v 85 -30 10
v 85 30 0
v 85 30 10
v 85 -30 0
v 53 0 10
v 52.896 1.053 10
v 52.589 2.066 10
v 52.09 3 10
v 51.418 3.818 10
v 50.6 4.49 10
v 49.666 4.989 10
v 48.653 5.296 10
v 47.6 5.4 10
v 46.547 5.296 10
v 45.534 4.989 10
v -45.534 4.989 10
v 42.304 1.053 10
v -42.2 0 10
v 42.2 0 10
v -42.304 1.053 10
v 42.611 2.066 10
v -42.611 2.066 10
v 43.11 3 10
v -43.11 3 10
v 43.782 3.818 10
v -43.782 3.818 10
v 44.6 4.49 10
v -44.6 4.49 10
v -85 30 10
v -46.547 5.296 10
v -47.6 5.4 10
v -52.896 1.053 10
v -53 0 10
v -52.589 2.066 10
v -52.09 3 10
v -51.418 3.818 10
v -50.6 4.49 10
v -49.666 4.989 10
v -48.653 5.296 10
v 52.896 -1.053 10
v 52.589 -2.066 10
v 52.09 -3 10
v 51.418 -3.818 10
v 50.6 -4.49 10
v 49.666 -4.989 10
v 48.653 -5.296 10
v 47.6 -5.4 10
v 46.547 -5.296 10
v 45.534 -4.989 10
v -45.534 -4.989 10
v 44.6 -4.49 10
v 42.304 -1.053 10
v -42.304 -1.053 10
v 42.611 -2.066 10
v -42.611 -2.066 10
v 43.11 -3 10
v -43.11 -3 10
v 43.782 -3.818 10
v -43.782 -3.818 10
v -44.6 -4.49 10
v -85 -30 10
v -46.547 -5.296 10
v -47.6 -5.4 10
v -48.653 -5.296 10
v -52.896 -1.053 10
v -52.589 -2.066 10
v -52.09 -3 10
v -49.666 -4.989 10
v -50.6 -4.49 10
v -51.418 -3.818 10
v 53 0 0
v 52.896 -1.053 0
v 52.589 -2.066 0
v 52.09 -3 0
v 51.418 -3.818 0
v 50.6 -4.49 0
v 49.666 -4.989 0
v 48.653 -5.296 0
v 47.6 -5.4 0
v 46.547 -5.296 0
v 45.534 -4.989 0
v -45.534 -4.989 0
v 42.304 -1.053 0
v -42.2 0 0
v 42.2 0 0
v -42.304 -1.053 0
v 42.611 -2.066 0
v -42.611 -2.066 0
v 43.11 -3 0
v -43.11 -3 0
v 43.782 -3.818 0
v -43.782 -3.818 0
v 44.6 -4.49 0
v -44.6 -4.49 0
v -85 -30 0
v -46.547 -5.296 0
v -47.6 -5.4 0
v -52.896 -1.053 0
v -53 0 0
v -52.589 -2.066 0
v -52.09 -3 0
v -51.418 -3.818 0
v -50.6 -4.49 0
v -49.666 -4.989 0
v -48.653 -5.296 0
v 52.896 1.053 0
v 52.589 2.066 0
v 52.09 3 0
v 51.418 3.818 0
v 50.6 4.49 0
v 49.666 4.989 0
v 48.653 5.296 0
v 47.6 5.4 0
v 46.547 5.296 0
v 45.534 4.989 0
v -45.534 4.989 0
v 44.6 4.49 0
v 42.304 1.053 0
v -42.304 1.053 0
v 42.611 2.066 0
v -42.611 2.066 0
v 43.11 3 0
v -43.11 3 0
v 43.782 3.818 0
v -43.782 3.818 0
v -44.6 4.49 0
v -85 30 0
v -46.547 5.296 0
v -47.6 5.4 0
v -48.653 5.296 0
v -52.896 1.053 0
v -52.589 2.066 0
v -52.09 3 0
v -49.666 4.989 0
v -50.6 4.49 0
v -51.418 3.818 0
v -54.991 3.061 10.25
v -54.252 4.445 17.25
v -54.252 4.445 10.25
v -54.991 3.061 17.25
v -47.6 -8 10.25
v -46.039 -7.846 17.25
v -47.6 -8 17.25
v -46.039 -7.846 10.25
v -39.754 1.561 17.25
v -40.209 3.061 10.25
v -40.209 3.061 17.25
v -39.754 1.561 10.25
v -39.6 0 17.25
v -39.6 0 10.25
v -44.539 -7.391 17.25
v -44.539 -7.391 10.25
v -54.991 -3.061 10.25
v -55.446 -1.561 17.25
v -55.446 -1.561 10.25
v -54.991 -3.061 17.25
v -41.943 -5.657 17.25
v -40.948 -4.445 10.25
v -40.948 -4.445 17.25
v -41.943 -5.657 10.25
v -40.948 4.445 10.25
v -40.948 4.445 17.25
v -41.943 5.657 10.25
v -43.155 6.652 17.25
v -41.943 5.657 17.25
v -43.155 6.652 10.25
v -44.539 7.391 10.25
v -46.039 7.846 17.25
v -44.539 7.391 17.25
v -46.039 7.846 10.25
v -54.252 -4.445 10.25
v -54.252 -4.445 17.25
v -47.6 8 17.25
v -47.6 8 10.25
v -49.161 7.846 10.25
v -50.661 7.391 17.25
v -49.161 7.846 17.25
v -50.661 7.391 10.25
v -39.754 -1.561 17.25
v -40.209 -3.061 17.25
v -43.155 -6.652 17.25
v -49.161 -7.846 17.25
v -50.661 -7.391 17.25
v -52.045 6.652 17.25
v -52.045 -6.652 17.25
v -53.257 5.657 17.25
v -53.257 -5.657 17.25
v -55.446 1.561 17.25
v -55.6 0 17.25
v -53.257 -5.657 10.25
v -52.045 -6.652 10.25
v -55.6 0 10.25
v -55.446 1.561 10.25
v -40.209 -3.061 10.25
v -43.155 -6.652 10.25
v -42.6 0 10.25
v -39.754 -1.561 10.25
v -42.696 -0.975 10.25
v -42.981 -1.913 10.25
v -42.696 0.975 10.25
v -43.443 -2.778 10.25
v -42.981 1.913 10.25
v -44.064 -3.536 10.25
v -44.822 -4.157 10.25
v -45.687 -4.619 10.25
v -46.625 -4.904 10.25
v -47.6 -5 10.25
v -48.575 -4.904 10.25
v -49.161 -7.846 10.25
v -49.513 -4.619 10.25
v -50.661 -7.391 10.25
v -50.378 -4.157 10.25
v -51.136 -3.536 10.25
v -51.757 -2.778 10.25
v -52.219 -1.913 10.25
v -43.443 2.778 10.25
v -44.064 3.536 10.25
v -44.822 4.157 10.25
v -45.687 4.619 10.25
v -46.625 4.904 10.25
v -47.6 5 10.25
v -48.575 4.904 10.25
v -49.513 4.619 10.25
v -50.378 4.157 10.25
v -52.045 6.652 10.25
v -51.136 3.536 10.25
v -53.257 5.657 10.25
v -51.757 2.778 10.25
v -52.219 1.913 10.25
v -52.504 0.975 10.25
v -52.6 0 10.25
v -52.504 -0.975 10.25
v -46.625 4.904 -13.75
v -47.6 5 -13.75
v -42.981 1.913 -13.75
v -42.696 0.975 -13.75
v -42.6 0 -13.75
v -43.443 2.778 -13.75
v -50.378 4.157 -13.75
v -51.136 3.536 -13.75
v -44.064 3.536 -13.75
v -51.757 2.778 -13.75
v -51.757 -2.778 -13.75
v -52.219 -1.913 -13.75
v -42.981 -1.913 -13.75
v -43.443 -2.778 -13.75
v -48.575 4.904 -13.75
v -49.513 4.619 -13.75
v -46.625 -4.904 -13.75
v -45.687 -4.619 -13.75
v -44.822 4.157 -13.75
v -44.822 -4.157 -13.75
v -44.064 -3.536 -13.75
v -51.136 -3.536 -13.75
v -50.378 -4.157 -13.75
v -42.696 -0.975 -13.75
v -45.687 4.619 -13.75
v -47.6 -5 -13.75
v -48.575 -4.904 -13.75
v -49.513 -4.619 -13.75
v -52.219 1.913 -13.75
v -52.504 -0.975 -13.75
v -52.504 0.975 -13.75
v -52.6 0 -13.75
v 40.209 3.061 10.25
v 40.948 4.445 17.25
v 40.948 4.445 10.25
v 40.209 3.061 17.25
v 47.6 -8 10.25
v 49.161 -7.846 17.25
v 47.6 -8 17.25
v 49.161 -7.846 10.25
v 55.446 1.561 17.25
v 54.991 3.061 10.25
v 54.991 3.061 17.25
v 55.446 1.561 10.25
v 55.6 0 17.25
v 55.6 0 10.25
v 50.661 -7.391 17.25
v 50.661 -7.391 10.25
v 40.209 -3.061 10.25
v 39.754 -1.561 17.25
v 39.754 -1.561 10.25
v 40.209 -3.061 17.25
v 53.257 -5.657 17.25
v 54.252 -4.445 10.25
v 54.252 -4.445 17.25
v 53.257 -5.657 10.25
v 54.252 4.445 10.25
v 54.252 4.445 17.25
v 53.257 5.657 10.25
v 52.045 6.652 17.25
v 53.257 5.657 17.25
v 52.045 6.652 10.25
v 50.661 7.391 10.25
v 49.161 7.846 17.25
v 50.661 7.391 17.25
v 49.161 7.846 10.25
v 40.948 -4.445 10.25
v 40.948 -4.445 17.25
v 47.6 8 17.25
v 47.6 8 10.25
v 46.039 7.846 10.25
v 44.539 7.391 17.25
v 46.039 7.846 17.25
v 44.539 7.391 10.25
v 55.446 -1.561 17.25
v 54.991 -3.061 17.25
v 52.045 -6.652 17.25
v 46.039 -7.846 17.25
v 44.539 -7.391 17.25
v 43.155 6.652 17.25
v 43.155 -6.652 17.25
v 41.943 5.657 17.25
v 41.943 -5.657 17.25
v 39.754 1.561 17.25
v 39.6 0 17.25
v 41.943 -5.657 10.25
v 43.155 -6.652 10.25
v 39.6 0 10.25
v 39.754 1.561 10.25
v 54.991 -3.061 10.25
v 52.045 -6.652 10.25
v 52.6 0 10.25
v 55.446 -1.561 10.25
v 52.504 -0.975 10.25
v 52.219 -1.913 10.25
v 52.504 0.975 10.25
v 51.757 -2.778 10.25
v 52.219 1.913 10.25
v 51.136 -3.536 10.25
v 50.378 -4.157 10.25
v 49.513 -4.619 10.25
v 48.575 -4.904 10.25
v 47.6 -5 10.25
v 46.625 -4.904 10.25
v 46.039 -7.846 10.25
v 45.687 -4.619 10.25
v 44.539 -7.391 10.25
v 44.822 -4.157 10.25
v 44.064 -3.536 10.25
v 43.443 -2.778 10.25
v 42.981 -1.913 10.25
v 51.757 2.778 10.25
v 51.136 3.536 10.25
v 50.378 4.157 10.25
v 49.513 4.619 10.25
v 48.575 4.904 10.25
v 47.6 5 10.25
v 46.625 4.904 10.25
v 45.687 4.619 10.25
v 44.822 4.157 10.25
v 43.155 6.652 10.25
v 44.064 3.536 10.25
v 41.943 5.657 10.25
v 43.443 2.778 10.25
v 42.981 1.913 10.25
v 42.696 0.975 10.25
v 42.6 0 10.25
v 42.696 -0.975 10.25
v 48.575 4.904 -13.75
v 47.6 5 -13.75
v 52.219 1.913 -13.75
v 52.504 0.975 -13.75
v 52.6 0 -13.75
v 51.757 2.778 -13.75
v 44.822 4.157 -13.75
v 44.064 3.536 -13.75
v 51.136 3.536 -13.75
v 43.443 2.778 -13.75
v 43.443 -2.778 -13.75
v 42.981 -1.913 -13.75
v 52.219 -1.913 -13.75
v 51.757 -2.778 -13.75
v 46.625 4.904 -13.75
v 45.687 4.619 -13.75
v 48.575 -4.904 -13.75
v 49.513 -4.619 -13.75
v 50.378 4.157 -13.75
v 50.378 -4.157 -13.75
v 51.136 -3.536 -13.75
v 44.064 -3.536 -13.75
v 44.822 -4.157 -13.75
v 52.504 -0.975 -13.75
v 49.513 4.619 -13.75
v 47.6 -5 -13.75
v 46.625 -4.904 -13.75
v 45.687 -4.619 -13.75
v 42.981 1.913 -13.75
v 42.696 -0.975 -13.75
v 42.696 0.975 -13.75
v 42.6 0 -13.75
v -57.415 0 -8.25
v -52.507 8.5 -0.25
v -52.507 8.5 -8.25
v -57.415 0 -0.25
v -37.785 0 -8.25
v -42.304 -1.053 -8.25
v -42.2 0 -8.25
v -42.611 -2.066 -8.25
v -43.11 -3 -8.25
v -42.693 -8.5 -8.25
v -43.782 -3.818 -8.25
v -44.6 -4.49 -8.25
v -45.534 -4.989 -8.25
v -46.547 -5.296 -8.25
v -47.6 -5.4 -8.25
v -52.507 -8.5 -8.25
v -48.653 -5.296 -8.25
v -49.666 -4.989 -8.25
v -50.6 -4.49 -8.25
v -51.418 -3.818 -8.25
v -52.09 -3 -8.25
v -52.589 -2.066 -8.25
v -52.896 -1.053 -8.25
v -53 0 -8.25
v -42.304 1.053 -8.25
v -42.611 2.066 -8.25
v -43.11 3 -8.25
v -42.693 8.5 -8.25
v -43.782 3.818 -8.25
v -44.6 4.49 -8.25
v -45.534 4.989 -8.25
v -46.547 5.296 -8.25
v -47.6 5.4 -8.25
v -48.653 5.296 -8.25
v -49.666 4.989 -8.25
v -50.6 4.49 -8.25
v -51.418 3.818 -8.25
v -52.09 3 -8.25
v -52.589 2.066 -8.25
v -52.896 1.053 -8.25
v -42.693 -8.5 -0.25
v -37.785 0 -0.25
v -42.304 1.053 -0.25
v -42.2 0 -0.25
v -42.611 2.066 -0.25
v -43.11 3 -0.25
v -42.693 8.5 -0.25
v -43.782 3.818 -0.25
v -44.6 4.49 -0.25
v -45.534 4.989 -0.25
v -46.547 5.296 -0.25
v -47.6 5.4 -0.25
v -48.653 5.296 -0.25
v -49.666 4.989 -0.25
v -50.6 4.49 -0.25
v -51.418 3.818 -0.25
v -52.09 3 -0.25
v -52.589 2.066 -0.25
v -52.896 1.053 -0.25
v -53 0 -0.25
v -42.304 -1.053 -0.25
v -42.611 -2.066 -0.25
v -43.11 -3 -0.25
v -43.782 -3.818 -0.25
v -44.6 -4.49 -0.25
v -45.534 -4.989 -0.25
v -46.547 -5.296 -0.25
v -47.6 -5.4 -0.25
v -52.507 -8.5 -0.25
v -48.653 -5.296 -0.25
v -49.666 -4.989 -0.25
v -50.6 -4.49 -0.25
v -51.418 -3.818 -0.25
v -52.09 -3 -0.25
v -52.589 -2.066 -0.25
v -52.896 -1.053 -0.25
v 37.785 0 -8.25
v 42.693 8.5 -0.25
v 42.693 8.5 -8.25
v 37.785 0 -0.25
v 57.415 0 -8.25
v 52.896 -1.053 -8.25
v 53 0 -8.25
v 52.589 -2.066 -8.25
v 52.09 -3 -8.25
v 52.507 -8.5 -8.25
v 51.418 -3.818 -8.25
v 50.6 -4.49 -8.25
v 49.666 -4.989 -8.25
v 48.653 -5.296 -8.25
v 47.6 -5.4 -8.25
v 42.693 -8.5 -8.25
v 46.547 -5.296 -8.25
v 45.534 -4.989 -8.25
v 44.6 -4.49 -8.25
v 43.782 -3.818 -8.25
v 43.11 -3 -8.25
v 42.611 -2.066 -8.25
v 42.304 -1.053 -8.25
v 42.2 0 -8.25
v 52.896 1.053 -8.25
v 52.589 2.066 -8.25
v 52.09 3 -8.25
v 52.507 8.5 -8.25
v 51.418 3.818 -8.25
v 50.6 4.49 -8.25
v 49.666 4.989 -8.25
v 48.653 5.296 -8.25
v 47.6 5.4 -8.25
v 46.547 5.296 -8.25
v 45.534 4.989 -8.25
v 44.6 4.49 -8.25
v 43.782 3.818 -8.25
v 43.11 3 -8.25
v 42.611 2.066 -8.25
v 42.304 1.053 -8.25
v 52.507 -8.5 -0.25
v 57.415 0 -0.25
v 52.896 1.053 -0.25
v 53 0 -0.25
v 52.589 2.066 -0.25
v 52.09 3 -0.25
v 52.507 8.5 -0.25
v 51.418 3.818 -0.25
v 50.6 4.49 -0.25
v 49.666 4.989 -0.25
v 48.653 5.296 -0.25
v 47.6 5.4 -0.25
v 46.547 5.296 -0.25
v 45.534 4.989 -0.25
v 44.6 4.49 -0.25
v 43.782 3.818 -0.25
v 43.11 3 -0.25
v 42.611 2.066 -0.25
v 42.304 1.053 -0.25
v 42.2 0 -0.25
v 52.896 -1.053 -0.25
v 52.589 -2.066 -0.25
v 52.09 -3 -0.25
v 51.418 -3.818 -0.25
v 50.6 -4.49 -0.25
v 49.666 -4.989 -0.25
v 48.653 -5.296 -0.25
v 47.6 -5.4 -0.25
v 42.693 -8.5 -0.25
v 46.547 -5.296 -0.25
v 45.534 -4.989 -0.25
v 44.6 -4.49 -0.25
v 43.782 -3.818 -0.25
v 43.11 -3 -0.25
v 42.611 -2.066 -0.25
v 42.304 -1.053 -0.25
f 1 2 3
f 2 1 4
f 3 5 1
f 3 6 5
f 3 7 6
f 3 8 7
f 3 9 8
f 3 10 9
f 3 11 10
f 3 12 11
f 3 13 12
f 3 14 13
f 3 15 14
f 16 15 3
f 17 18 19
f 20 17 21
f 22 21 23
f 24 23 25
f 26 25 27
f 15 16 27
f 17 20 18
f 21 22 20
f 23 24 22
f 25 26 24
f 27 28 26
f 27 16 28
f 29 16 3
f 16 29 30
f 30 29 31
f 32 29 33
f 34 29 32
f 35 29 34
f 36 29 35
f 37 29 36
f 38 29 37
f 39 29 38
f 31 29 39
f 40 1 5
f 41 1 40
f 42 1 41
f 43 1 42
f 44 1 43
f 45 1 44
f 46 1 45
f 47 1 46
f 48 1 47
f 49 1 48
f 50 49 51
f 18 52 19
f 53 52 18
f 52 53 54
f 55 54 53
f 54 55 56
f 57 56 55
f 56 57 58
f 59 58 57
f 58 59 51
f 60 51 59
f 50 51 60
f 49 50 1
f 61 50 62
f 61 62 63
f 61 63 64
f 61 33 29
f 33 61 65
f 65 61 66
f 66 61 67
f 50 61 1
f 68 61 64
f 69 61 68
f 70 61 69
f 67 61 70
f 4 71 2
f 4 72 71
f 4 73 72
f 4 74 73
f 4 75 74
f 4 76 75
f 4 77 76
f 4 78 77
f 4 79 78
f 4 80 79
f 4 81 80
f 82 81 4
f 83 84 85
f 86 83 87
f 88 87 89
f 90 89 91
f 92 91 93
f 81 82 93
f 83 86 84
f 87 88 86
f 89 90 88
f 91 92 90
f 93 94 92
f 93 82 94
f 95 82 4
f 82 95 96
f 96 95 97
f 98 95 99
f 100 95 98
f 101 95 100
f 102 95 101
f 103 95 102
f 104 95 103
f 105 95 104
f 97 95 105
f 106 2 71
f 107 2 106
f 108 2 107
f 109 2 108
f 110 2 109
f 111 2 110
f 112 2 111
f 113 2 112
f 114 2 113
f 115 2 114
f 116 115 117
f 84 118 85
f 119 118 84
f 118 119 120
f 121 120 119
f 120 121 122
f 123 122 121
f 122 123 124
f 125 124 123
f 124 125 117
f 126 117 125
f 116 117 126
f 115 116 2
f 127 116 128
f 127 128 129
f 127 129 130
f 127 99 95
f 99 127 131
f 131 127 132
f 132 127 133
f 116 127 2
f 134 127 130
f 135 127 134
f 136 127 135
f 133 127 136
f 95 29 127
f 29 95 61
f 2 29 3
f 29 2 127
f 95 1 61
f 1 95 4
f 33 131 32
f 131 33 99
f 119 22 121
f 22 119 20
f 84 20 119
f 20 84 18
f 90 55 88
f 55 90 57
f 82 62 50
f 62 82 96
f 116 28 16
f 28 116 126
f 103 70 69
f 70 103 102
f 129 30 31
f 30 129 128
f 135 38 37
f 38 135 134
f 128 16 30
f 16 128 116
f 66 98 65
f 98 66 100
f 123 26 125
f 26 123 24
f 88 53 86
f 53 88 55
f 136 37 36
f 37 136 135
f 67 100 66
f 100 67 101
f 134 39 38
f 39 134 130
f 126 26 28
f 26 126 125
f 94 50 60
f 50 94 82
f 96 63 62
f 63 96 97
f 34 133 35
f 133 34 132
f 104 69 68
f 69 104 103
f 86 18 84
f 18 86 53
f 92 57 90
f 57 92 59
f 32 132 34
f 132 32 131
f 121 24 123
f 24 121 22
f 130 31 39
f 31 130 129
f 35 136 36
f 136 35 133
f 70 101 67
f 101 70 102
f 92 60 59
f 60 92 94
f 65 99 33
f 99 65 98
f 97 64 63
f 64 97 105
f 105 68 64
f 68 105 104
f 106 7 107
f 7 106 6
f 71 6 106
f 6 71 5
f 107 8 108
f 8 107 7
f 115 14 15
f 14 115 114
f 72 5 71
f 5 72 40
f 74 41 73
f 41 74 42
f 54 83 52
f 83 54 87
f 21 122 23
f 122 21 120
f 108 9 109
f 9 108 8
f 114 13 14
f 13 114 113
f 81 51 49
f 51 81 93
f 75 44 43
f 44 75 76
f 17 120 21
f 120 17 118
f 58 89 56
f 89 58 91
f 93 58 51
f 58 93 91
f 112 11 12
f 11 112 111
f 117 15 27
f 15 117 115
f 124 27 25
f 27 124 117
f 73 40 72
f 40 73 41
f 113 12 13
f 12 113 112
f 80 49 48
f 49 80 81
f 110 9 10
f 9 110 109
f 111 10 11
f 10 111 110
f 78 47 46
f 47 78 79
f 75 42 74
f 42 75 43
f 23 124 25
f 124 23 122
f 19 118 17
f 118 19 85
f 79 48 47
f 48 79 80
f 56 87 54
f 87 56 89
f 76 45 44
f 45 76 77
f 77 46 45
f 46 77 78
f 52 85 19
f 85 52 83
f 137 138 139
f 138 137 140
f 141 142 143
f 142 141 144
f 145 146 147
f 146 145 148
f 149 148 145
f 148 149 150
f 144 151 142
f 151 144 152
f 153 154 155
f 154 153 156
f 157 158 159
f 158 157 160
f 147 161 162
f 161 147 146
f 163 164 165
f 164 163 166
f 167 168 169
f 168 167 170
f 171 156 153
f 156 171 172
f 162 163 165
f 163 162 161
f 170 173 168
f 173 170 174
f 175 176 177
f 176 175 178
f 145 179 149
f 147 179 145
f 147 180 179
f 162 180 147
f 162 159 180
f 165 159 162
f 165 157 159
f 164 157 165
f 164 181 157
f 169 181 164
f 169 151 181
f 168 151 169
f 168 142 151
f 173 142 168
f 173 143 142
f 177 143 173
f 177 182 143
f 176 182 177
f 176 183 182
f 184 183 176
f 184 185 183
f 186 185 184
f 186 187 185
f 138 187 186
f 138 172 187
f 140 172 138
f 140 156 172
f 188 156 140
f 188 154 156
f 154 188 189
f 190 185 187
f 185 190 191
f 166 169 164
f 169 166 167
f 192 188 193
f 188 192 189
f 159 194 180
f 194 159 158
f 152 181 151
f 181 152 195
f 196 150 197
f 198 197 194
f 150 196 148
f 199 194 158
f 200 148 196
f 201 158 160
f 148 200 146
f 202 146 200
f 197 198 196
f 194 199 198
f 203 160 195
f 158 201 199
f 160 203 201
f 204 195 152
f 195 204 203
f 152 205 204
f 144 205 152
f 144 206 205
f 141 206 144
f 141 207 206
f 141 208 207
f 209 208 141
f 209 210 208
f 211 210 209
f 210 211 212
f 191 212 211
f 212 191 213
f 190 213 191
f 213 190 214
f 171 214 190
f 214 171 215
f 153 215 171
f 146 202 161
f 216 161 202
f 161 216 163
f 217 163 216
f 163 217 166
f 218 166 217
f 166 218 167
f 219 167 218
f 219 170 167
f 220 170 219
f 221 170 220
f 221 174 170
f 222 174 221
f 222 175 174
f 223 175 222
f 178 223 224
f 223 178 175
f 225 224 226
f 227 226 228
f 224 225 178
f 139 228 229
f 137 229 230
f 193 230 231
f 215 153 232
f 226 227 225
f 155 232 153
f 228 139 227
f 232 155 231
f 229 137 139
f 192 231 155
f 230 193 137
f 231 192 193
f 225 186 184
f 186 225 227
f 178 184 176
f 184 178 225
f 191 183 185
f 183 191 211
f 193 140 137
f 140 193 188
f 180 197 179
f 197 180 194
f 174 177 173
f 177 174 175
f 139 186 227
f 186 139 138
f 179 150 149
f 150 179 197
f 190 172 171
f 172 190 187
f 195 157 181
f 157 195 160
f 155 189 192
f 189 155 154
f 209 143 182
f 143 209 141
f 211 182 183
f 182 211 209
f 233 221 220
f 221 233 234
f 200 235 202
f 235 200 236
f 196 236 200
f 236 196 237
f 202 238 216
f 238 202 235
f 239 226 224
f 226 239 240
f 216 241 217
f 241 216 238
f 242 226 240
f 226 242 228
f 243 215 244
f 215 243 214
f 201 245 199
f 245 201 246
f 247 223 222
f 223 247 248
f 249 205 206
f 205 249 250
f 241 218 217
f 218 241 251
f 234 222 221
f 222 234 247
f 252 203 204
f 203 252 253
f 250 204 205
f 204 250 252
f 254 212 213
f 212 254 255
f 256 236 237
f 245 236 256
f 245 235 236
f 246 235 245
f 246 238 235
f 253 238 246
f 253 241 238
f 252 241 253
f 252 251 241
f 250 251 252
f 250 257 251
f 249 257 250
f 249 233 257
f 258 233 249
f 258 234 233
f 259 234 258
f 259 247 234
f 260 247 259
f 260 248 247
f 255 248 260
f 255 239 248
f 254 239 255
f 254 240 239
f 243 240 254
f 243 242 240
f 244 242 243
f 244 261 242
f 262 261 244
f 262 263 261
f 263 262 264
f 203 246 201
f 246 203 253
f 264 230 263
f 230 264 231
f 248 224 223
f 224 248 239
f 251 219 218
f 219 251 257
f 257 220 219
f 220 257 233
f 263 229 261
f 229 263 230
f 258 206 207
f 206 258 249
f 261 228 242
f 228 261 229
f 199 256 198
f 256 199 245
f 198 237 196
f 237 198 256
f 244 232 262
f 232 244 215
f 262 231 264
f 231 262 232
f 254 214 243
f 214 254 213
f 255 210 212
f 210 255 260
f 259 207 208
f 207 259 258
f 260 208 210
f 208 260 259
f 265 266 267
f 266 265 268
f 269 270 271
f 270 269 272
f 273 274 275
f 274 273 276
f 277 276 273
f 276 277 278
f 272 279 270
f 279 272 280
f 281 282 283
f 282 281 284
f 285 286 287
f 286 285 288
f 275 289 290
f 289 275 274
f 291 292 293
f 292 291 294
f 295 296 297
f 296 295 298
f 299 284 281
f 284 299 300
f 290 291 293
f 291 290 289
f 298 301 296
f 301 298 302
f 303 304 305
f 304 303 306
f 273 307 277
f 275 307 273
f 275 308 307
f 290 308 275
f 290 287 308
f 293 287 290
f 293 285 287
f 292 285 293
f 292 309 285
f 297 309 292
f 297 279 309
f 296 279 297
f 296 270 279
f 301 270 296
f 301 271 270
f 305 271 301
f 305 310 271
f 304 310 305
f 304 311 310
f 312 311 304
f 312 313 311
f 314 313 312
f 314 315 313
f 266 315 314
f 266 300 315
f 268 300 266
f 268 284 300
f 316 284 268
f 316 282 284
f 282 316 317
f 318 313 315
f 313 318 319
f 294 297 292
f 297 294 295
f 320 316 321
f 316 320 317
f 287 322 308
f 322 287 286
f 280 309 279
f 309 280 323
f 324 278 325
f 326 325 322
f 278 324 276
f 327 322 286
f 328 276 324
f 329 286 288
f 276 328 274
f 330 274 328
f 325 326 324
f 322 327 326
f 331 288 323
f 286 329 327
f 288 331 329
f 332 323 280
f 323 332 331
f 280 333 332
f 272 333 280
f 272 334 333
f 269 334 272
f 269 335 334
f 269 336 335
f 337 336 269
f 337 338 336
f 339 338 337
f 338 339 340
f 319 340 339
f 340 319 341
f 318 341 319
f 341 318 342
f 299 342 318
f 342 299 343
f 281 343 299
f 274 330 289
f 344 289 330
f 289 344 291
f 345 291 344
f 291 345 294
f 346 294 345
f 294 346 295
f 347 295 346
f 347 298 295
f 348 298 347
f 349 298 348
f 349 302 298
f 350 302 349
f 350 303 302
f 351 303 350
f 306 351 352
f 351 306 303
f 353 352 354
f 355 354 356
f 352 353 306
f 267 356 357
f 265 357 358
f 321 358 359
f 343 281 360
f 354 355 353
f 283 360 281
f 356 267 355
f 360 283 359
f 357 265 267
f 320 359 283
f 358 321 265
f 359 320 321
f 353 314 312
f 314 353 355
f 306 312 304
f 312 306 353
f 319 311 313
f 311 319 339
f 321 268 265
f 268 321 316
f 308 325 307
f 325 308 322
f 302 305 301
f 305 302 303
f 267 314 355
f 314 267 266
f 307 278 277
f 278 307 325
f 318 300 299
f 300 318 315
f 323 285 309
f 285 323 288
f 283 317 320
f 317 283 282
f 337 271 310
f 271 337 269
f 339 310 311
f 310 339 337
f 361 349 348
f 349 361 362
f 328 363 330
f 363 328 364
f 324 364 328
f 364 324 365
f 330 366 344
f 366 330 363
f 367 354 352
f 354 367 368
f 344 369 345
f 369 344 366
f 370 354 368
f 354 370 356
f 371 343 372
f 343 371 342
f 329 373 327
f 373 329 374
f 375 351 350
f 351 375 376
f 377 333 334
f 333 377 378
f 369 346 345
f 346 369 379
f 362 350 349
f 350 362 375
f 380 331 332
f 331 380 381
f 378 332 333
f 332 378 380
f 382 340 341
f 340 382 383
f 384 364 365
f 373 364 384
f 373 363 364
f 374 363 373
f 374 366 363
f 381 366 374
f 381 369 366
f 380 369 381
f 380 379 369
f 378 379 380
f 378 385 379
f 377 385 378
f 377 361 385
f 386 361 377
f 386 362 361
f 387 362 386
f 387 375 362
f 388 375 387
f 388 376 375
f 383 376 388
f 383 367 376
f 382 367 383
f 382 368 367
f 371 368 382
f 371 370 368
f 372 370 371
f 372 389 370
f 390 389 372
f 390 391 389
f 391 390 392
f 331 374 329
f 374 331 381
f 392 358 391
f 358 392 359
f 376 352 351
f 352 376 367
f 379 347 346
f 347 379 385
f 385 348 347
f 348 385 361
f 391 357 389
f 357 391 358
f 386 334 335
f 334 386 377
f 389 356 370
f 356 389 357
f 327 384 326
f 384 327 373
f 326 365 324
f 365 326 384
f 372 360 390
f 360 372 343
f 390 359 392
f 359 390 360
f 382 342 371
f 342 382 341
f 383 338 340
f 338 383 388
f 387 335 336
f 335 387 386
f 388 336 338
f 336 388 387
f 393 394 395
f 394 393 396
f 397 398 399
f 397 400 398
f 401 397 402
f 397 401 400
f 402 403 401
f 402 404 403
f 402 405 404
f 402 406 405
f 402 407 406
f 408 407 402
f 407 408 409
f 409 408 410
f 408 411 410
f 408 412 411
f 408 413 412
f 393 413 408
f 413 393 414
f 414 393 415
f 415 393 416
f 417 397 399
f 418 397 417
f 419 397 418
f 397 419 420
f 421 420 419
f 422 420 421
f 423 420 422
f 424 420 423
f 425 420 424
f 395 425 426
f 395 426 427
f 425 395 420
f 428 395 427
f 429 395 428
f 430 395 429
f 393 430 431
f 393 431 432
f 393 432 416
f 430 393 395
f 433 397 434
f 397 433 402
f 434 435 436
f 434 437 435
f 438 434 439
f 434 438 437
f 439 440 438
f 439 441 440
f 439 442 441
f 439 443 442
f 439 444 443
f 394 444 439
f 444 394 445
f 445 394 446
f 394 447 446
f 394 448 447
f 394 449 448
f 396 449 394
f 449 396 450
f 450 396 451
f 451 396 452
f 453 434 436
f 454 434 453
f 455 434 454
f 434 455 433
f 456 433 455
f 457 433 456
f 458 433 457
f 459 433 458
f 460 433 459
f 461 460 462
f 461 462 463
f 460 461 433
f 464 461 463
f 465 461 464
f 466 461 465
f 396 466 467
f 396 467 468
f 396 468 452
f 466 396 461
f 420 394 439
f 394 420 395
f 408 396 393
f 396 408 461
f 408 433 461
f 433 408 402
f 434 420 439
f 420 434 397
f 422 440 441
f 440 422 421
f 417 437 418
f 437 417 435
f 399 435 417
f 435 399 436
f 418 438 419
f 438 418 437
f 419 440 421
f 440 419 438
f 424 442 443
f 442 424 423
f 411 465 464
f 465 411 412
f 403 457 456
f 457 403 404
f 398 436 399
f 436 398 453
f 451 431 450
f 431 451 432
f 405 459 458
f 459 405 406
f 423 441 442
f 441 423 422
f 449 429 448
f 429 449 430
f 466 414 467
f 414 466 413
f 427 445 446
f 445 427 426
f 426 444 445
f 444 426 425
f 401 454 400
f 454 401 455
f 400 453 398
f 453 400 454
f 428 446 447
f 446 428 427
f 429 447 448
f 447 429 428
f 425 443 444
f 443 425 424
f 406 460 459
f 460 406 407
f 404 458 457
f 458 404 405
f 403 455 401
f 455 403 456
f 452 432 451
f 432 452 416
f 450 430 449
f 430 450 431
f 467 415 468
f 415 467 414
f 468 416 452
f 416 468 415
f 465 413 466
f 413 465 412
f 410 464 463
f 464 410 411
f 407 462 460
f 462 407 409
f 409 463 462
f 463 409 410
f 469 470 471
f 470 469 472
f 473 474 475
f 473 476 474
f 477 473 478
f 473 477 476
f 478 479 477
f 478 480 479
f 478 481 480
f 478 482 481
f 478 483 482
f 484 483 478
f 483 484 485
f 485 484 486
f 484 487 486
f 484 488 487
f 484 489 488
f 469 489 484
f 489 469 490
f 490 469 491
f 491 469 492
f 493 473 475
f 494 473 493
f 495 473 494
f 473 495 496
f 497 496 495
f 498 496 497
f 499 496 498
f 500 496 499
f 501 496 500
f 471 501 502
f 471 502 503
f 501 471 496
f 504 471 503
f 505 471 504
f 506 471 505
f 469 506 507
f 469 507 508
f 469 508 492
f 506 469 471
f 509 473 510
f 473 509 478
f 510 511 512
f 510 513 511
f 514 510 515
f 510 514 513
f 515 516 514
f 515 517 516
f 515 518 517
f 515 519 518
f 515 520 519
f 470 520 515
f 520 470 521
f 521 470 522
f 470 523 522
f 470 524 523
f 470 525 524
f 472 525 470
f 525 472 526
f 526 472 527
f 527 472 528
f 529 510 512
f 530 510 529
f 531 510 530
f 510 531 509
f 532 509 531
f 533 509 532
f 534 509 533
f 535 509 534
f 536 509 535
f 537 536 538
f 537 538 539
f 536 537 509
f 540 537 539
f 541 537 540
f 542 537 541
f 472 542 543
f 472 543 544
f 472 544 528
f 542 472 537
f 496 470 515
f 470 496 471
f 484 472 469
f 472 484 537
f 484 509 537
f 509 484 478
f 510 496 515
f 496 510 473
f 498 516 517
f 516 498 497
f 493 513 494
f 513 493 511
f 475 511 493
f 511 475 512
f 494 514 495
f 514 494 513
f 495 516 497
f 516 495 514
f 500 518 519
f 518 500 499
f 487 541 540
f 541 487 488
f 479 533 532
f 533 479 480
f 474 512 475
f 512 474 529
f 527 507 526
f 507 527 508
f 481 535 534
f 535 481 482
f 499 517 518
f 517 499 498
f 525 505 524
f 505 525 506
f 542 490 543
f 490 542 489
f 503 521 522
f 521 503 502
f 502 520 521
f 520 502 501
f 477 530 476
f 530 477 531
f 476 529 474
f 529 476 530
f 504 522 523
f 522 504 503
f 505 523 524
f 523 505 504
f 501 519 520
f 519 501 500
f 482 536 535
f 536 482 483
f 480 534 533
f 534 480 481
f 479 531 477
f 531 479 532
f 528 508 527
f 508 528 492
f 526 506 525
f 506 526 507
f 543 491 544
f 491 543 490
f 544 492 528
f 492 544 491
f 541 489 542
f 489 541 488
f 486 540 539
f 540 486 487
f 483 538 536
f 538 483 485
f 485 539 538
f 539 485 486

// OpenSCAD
$fn = 32;

// ------------------------------------------------------------------------
// Bolted plate: 170 x 60 x 10 mm plate, 2 fasteners
// Every part is its own module, assembly() places them once.
// ------------------------------------------------------------------------

// --- part 1 ---
module plate() {
  difference() {
    translate([-85, -30, 0]) cube([170, 60, 10]);
    translate([-47.6, 0, -1]) cylinder(h = 12, d = 10.8);
    translate([47.6, 0, -1]) cylinder(h = 12, d = 10.8);
  }
}

// --- part 2 ---
module bolt1() {
  cylinder(h = 7, d = 16);
  translate([0, 0, -24]) cylinder(h = 24, d = 10);
}

// --- part 3 ---
module bolt2() {
  cylinder(h = 7, d = 16);
  translate([0, 0, -24]) cylinder(h = 24, d = 10);
}

// --- part 4 ---
module nut1() {
  difference() {
    linear_extrude(height = 8) polygon(points = [[9.815, 0], [4.907, 8.5], [-4.907, 8.5], [-9.815, 0], [-4.907, -8.5], [4.907, -8.5]]);
    translate([0, 0, -1]) cylinder(h = 10, d = 10.8);
  }
}

// --- part 5 ---
module nut2() {
  difference() {
    linear_extrude(height = 8) polygon(points = [[9.815, 0], [4.907, 8.5], [-4.907, 8.5], [-9.815, 0], [-4.907, -8.5], [4.907, -8.5]]);
    translate([0, 0, -1]) cylinder(h = 10, d = 10.8);
  }
}

// --- assembly ---
module assembly() {
  translate([0, 0, 0]) rotate([0, 0, 0]) plate();
  translate([-47.6, 0, 10.25]) rotate([0, 0, 0]) bolt1();
  translate([47.6, 0, 10.25]) rotate([0, 0, 0]) bolt2();
  translate([-47.6, 0, -8.25]) rotate([0, 0, 0]) nut1();
  translate([47.6, 0, -8.25]) rotate([0, 0, 0]) nut2();
}

assembly();
